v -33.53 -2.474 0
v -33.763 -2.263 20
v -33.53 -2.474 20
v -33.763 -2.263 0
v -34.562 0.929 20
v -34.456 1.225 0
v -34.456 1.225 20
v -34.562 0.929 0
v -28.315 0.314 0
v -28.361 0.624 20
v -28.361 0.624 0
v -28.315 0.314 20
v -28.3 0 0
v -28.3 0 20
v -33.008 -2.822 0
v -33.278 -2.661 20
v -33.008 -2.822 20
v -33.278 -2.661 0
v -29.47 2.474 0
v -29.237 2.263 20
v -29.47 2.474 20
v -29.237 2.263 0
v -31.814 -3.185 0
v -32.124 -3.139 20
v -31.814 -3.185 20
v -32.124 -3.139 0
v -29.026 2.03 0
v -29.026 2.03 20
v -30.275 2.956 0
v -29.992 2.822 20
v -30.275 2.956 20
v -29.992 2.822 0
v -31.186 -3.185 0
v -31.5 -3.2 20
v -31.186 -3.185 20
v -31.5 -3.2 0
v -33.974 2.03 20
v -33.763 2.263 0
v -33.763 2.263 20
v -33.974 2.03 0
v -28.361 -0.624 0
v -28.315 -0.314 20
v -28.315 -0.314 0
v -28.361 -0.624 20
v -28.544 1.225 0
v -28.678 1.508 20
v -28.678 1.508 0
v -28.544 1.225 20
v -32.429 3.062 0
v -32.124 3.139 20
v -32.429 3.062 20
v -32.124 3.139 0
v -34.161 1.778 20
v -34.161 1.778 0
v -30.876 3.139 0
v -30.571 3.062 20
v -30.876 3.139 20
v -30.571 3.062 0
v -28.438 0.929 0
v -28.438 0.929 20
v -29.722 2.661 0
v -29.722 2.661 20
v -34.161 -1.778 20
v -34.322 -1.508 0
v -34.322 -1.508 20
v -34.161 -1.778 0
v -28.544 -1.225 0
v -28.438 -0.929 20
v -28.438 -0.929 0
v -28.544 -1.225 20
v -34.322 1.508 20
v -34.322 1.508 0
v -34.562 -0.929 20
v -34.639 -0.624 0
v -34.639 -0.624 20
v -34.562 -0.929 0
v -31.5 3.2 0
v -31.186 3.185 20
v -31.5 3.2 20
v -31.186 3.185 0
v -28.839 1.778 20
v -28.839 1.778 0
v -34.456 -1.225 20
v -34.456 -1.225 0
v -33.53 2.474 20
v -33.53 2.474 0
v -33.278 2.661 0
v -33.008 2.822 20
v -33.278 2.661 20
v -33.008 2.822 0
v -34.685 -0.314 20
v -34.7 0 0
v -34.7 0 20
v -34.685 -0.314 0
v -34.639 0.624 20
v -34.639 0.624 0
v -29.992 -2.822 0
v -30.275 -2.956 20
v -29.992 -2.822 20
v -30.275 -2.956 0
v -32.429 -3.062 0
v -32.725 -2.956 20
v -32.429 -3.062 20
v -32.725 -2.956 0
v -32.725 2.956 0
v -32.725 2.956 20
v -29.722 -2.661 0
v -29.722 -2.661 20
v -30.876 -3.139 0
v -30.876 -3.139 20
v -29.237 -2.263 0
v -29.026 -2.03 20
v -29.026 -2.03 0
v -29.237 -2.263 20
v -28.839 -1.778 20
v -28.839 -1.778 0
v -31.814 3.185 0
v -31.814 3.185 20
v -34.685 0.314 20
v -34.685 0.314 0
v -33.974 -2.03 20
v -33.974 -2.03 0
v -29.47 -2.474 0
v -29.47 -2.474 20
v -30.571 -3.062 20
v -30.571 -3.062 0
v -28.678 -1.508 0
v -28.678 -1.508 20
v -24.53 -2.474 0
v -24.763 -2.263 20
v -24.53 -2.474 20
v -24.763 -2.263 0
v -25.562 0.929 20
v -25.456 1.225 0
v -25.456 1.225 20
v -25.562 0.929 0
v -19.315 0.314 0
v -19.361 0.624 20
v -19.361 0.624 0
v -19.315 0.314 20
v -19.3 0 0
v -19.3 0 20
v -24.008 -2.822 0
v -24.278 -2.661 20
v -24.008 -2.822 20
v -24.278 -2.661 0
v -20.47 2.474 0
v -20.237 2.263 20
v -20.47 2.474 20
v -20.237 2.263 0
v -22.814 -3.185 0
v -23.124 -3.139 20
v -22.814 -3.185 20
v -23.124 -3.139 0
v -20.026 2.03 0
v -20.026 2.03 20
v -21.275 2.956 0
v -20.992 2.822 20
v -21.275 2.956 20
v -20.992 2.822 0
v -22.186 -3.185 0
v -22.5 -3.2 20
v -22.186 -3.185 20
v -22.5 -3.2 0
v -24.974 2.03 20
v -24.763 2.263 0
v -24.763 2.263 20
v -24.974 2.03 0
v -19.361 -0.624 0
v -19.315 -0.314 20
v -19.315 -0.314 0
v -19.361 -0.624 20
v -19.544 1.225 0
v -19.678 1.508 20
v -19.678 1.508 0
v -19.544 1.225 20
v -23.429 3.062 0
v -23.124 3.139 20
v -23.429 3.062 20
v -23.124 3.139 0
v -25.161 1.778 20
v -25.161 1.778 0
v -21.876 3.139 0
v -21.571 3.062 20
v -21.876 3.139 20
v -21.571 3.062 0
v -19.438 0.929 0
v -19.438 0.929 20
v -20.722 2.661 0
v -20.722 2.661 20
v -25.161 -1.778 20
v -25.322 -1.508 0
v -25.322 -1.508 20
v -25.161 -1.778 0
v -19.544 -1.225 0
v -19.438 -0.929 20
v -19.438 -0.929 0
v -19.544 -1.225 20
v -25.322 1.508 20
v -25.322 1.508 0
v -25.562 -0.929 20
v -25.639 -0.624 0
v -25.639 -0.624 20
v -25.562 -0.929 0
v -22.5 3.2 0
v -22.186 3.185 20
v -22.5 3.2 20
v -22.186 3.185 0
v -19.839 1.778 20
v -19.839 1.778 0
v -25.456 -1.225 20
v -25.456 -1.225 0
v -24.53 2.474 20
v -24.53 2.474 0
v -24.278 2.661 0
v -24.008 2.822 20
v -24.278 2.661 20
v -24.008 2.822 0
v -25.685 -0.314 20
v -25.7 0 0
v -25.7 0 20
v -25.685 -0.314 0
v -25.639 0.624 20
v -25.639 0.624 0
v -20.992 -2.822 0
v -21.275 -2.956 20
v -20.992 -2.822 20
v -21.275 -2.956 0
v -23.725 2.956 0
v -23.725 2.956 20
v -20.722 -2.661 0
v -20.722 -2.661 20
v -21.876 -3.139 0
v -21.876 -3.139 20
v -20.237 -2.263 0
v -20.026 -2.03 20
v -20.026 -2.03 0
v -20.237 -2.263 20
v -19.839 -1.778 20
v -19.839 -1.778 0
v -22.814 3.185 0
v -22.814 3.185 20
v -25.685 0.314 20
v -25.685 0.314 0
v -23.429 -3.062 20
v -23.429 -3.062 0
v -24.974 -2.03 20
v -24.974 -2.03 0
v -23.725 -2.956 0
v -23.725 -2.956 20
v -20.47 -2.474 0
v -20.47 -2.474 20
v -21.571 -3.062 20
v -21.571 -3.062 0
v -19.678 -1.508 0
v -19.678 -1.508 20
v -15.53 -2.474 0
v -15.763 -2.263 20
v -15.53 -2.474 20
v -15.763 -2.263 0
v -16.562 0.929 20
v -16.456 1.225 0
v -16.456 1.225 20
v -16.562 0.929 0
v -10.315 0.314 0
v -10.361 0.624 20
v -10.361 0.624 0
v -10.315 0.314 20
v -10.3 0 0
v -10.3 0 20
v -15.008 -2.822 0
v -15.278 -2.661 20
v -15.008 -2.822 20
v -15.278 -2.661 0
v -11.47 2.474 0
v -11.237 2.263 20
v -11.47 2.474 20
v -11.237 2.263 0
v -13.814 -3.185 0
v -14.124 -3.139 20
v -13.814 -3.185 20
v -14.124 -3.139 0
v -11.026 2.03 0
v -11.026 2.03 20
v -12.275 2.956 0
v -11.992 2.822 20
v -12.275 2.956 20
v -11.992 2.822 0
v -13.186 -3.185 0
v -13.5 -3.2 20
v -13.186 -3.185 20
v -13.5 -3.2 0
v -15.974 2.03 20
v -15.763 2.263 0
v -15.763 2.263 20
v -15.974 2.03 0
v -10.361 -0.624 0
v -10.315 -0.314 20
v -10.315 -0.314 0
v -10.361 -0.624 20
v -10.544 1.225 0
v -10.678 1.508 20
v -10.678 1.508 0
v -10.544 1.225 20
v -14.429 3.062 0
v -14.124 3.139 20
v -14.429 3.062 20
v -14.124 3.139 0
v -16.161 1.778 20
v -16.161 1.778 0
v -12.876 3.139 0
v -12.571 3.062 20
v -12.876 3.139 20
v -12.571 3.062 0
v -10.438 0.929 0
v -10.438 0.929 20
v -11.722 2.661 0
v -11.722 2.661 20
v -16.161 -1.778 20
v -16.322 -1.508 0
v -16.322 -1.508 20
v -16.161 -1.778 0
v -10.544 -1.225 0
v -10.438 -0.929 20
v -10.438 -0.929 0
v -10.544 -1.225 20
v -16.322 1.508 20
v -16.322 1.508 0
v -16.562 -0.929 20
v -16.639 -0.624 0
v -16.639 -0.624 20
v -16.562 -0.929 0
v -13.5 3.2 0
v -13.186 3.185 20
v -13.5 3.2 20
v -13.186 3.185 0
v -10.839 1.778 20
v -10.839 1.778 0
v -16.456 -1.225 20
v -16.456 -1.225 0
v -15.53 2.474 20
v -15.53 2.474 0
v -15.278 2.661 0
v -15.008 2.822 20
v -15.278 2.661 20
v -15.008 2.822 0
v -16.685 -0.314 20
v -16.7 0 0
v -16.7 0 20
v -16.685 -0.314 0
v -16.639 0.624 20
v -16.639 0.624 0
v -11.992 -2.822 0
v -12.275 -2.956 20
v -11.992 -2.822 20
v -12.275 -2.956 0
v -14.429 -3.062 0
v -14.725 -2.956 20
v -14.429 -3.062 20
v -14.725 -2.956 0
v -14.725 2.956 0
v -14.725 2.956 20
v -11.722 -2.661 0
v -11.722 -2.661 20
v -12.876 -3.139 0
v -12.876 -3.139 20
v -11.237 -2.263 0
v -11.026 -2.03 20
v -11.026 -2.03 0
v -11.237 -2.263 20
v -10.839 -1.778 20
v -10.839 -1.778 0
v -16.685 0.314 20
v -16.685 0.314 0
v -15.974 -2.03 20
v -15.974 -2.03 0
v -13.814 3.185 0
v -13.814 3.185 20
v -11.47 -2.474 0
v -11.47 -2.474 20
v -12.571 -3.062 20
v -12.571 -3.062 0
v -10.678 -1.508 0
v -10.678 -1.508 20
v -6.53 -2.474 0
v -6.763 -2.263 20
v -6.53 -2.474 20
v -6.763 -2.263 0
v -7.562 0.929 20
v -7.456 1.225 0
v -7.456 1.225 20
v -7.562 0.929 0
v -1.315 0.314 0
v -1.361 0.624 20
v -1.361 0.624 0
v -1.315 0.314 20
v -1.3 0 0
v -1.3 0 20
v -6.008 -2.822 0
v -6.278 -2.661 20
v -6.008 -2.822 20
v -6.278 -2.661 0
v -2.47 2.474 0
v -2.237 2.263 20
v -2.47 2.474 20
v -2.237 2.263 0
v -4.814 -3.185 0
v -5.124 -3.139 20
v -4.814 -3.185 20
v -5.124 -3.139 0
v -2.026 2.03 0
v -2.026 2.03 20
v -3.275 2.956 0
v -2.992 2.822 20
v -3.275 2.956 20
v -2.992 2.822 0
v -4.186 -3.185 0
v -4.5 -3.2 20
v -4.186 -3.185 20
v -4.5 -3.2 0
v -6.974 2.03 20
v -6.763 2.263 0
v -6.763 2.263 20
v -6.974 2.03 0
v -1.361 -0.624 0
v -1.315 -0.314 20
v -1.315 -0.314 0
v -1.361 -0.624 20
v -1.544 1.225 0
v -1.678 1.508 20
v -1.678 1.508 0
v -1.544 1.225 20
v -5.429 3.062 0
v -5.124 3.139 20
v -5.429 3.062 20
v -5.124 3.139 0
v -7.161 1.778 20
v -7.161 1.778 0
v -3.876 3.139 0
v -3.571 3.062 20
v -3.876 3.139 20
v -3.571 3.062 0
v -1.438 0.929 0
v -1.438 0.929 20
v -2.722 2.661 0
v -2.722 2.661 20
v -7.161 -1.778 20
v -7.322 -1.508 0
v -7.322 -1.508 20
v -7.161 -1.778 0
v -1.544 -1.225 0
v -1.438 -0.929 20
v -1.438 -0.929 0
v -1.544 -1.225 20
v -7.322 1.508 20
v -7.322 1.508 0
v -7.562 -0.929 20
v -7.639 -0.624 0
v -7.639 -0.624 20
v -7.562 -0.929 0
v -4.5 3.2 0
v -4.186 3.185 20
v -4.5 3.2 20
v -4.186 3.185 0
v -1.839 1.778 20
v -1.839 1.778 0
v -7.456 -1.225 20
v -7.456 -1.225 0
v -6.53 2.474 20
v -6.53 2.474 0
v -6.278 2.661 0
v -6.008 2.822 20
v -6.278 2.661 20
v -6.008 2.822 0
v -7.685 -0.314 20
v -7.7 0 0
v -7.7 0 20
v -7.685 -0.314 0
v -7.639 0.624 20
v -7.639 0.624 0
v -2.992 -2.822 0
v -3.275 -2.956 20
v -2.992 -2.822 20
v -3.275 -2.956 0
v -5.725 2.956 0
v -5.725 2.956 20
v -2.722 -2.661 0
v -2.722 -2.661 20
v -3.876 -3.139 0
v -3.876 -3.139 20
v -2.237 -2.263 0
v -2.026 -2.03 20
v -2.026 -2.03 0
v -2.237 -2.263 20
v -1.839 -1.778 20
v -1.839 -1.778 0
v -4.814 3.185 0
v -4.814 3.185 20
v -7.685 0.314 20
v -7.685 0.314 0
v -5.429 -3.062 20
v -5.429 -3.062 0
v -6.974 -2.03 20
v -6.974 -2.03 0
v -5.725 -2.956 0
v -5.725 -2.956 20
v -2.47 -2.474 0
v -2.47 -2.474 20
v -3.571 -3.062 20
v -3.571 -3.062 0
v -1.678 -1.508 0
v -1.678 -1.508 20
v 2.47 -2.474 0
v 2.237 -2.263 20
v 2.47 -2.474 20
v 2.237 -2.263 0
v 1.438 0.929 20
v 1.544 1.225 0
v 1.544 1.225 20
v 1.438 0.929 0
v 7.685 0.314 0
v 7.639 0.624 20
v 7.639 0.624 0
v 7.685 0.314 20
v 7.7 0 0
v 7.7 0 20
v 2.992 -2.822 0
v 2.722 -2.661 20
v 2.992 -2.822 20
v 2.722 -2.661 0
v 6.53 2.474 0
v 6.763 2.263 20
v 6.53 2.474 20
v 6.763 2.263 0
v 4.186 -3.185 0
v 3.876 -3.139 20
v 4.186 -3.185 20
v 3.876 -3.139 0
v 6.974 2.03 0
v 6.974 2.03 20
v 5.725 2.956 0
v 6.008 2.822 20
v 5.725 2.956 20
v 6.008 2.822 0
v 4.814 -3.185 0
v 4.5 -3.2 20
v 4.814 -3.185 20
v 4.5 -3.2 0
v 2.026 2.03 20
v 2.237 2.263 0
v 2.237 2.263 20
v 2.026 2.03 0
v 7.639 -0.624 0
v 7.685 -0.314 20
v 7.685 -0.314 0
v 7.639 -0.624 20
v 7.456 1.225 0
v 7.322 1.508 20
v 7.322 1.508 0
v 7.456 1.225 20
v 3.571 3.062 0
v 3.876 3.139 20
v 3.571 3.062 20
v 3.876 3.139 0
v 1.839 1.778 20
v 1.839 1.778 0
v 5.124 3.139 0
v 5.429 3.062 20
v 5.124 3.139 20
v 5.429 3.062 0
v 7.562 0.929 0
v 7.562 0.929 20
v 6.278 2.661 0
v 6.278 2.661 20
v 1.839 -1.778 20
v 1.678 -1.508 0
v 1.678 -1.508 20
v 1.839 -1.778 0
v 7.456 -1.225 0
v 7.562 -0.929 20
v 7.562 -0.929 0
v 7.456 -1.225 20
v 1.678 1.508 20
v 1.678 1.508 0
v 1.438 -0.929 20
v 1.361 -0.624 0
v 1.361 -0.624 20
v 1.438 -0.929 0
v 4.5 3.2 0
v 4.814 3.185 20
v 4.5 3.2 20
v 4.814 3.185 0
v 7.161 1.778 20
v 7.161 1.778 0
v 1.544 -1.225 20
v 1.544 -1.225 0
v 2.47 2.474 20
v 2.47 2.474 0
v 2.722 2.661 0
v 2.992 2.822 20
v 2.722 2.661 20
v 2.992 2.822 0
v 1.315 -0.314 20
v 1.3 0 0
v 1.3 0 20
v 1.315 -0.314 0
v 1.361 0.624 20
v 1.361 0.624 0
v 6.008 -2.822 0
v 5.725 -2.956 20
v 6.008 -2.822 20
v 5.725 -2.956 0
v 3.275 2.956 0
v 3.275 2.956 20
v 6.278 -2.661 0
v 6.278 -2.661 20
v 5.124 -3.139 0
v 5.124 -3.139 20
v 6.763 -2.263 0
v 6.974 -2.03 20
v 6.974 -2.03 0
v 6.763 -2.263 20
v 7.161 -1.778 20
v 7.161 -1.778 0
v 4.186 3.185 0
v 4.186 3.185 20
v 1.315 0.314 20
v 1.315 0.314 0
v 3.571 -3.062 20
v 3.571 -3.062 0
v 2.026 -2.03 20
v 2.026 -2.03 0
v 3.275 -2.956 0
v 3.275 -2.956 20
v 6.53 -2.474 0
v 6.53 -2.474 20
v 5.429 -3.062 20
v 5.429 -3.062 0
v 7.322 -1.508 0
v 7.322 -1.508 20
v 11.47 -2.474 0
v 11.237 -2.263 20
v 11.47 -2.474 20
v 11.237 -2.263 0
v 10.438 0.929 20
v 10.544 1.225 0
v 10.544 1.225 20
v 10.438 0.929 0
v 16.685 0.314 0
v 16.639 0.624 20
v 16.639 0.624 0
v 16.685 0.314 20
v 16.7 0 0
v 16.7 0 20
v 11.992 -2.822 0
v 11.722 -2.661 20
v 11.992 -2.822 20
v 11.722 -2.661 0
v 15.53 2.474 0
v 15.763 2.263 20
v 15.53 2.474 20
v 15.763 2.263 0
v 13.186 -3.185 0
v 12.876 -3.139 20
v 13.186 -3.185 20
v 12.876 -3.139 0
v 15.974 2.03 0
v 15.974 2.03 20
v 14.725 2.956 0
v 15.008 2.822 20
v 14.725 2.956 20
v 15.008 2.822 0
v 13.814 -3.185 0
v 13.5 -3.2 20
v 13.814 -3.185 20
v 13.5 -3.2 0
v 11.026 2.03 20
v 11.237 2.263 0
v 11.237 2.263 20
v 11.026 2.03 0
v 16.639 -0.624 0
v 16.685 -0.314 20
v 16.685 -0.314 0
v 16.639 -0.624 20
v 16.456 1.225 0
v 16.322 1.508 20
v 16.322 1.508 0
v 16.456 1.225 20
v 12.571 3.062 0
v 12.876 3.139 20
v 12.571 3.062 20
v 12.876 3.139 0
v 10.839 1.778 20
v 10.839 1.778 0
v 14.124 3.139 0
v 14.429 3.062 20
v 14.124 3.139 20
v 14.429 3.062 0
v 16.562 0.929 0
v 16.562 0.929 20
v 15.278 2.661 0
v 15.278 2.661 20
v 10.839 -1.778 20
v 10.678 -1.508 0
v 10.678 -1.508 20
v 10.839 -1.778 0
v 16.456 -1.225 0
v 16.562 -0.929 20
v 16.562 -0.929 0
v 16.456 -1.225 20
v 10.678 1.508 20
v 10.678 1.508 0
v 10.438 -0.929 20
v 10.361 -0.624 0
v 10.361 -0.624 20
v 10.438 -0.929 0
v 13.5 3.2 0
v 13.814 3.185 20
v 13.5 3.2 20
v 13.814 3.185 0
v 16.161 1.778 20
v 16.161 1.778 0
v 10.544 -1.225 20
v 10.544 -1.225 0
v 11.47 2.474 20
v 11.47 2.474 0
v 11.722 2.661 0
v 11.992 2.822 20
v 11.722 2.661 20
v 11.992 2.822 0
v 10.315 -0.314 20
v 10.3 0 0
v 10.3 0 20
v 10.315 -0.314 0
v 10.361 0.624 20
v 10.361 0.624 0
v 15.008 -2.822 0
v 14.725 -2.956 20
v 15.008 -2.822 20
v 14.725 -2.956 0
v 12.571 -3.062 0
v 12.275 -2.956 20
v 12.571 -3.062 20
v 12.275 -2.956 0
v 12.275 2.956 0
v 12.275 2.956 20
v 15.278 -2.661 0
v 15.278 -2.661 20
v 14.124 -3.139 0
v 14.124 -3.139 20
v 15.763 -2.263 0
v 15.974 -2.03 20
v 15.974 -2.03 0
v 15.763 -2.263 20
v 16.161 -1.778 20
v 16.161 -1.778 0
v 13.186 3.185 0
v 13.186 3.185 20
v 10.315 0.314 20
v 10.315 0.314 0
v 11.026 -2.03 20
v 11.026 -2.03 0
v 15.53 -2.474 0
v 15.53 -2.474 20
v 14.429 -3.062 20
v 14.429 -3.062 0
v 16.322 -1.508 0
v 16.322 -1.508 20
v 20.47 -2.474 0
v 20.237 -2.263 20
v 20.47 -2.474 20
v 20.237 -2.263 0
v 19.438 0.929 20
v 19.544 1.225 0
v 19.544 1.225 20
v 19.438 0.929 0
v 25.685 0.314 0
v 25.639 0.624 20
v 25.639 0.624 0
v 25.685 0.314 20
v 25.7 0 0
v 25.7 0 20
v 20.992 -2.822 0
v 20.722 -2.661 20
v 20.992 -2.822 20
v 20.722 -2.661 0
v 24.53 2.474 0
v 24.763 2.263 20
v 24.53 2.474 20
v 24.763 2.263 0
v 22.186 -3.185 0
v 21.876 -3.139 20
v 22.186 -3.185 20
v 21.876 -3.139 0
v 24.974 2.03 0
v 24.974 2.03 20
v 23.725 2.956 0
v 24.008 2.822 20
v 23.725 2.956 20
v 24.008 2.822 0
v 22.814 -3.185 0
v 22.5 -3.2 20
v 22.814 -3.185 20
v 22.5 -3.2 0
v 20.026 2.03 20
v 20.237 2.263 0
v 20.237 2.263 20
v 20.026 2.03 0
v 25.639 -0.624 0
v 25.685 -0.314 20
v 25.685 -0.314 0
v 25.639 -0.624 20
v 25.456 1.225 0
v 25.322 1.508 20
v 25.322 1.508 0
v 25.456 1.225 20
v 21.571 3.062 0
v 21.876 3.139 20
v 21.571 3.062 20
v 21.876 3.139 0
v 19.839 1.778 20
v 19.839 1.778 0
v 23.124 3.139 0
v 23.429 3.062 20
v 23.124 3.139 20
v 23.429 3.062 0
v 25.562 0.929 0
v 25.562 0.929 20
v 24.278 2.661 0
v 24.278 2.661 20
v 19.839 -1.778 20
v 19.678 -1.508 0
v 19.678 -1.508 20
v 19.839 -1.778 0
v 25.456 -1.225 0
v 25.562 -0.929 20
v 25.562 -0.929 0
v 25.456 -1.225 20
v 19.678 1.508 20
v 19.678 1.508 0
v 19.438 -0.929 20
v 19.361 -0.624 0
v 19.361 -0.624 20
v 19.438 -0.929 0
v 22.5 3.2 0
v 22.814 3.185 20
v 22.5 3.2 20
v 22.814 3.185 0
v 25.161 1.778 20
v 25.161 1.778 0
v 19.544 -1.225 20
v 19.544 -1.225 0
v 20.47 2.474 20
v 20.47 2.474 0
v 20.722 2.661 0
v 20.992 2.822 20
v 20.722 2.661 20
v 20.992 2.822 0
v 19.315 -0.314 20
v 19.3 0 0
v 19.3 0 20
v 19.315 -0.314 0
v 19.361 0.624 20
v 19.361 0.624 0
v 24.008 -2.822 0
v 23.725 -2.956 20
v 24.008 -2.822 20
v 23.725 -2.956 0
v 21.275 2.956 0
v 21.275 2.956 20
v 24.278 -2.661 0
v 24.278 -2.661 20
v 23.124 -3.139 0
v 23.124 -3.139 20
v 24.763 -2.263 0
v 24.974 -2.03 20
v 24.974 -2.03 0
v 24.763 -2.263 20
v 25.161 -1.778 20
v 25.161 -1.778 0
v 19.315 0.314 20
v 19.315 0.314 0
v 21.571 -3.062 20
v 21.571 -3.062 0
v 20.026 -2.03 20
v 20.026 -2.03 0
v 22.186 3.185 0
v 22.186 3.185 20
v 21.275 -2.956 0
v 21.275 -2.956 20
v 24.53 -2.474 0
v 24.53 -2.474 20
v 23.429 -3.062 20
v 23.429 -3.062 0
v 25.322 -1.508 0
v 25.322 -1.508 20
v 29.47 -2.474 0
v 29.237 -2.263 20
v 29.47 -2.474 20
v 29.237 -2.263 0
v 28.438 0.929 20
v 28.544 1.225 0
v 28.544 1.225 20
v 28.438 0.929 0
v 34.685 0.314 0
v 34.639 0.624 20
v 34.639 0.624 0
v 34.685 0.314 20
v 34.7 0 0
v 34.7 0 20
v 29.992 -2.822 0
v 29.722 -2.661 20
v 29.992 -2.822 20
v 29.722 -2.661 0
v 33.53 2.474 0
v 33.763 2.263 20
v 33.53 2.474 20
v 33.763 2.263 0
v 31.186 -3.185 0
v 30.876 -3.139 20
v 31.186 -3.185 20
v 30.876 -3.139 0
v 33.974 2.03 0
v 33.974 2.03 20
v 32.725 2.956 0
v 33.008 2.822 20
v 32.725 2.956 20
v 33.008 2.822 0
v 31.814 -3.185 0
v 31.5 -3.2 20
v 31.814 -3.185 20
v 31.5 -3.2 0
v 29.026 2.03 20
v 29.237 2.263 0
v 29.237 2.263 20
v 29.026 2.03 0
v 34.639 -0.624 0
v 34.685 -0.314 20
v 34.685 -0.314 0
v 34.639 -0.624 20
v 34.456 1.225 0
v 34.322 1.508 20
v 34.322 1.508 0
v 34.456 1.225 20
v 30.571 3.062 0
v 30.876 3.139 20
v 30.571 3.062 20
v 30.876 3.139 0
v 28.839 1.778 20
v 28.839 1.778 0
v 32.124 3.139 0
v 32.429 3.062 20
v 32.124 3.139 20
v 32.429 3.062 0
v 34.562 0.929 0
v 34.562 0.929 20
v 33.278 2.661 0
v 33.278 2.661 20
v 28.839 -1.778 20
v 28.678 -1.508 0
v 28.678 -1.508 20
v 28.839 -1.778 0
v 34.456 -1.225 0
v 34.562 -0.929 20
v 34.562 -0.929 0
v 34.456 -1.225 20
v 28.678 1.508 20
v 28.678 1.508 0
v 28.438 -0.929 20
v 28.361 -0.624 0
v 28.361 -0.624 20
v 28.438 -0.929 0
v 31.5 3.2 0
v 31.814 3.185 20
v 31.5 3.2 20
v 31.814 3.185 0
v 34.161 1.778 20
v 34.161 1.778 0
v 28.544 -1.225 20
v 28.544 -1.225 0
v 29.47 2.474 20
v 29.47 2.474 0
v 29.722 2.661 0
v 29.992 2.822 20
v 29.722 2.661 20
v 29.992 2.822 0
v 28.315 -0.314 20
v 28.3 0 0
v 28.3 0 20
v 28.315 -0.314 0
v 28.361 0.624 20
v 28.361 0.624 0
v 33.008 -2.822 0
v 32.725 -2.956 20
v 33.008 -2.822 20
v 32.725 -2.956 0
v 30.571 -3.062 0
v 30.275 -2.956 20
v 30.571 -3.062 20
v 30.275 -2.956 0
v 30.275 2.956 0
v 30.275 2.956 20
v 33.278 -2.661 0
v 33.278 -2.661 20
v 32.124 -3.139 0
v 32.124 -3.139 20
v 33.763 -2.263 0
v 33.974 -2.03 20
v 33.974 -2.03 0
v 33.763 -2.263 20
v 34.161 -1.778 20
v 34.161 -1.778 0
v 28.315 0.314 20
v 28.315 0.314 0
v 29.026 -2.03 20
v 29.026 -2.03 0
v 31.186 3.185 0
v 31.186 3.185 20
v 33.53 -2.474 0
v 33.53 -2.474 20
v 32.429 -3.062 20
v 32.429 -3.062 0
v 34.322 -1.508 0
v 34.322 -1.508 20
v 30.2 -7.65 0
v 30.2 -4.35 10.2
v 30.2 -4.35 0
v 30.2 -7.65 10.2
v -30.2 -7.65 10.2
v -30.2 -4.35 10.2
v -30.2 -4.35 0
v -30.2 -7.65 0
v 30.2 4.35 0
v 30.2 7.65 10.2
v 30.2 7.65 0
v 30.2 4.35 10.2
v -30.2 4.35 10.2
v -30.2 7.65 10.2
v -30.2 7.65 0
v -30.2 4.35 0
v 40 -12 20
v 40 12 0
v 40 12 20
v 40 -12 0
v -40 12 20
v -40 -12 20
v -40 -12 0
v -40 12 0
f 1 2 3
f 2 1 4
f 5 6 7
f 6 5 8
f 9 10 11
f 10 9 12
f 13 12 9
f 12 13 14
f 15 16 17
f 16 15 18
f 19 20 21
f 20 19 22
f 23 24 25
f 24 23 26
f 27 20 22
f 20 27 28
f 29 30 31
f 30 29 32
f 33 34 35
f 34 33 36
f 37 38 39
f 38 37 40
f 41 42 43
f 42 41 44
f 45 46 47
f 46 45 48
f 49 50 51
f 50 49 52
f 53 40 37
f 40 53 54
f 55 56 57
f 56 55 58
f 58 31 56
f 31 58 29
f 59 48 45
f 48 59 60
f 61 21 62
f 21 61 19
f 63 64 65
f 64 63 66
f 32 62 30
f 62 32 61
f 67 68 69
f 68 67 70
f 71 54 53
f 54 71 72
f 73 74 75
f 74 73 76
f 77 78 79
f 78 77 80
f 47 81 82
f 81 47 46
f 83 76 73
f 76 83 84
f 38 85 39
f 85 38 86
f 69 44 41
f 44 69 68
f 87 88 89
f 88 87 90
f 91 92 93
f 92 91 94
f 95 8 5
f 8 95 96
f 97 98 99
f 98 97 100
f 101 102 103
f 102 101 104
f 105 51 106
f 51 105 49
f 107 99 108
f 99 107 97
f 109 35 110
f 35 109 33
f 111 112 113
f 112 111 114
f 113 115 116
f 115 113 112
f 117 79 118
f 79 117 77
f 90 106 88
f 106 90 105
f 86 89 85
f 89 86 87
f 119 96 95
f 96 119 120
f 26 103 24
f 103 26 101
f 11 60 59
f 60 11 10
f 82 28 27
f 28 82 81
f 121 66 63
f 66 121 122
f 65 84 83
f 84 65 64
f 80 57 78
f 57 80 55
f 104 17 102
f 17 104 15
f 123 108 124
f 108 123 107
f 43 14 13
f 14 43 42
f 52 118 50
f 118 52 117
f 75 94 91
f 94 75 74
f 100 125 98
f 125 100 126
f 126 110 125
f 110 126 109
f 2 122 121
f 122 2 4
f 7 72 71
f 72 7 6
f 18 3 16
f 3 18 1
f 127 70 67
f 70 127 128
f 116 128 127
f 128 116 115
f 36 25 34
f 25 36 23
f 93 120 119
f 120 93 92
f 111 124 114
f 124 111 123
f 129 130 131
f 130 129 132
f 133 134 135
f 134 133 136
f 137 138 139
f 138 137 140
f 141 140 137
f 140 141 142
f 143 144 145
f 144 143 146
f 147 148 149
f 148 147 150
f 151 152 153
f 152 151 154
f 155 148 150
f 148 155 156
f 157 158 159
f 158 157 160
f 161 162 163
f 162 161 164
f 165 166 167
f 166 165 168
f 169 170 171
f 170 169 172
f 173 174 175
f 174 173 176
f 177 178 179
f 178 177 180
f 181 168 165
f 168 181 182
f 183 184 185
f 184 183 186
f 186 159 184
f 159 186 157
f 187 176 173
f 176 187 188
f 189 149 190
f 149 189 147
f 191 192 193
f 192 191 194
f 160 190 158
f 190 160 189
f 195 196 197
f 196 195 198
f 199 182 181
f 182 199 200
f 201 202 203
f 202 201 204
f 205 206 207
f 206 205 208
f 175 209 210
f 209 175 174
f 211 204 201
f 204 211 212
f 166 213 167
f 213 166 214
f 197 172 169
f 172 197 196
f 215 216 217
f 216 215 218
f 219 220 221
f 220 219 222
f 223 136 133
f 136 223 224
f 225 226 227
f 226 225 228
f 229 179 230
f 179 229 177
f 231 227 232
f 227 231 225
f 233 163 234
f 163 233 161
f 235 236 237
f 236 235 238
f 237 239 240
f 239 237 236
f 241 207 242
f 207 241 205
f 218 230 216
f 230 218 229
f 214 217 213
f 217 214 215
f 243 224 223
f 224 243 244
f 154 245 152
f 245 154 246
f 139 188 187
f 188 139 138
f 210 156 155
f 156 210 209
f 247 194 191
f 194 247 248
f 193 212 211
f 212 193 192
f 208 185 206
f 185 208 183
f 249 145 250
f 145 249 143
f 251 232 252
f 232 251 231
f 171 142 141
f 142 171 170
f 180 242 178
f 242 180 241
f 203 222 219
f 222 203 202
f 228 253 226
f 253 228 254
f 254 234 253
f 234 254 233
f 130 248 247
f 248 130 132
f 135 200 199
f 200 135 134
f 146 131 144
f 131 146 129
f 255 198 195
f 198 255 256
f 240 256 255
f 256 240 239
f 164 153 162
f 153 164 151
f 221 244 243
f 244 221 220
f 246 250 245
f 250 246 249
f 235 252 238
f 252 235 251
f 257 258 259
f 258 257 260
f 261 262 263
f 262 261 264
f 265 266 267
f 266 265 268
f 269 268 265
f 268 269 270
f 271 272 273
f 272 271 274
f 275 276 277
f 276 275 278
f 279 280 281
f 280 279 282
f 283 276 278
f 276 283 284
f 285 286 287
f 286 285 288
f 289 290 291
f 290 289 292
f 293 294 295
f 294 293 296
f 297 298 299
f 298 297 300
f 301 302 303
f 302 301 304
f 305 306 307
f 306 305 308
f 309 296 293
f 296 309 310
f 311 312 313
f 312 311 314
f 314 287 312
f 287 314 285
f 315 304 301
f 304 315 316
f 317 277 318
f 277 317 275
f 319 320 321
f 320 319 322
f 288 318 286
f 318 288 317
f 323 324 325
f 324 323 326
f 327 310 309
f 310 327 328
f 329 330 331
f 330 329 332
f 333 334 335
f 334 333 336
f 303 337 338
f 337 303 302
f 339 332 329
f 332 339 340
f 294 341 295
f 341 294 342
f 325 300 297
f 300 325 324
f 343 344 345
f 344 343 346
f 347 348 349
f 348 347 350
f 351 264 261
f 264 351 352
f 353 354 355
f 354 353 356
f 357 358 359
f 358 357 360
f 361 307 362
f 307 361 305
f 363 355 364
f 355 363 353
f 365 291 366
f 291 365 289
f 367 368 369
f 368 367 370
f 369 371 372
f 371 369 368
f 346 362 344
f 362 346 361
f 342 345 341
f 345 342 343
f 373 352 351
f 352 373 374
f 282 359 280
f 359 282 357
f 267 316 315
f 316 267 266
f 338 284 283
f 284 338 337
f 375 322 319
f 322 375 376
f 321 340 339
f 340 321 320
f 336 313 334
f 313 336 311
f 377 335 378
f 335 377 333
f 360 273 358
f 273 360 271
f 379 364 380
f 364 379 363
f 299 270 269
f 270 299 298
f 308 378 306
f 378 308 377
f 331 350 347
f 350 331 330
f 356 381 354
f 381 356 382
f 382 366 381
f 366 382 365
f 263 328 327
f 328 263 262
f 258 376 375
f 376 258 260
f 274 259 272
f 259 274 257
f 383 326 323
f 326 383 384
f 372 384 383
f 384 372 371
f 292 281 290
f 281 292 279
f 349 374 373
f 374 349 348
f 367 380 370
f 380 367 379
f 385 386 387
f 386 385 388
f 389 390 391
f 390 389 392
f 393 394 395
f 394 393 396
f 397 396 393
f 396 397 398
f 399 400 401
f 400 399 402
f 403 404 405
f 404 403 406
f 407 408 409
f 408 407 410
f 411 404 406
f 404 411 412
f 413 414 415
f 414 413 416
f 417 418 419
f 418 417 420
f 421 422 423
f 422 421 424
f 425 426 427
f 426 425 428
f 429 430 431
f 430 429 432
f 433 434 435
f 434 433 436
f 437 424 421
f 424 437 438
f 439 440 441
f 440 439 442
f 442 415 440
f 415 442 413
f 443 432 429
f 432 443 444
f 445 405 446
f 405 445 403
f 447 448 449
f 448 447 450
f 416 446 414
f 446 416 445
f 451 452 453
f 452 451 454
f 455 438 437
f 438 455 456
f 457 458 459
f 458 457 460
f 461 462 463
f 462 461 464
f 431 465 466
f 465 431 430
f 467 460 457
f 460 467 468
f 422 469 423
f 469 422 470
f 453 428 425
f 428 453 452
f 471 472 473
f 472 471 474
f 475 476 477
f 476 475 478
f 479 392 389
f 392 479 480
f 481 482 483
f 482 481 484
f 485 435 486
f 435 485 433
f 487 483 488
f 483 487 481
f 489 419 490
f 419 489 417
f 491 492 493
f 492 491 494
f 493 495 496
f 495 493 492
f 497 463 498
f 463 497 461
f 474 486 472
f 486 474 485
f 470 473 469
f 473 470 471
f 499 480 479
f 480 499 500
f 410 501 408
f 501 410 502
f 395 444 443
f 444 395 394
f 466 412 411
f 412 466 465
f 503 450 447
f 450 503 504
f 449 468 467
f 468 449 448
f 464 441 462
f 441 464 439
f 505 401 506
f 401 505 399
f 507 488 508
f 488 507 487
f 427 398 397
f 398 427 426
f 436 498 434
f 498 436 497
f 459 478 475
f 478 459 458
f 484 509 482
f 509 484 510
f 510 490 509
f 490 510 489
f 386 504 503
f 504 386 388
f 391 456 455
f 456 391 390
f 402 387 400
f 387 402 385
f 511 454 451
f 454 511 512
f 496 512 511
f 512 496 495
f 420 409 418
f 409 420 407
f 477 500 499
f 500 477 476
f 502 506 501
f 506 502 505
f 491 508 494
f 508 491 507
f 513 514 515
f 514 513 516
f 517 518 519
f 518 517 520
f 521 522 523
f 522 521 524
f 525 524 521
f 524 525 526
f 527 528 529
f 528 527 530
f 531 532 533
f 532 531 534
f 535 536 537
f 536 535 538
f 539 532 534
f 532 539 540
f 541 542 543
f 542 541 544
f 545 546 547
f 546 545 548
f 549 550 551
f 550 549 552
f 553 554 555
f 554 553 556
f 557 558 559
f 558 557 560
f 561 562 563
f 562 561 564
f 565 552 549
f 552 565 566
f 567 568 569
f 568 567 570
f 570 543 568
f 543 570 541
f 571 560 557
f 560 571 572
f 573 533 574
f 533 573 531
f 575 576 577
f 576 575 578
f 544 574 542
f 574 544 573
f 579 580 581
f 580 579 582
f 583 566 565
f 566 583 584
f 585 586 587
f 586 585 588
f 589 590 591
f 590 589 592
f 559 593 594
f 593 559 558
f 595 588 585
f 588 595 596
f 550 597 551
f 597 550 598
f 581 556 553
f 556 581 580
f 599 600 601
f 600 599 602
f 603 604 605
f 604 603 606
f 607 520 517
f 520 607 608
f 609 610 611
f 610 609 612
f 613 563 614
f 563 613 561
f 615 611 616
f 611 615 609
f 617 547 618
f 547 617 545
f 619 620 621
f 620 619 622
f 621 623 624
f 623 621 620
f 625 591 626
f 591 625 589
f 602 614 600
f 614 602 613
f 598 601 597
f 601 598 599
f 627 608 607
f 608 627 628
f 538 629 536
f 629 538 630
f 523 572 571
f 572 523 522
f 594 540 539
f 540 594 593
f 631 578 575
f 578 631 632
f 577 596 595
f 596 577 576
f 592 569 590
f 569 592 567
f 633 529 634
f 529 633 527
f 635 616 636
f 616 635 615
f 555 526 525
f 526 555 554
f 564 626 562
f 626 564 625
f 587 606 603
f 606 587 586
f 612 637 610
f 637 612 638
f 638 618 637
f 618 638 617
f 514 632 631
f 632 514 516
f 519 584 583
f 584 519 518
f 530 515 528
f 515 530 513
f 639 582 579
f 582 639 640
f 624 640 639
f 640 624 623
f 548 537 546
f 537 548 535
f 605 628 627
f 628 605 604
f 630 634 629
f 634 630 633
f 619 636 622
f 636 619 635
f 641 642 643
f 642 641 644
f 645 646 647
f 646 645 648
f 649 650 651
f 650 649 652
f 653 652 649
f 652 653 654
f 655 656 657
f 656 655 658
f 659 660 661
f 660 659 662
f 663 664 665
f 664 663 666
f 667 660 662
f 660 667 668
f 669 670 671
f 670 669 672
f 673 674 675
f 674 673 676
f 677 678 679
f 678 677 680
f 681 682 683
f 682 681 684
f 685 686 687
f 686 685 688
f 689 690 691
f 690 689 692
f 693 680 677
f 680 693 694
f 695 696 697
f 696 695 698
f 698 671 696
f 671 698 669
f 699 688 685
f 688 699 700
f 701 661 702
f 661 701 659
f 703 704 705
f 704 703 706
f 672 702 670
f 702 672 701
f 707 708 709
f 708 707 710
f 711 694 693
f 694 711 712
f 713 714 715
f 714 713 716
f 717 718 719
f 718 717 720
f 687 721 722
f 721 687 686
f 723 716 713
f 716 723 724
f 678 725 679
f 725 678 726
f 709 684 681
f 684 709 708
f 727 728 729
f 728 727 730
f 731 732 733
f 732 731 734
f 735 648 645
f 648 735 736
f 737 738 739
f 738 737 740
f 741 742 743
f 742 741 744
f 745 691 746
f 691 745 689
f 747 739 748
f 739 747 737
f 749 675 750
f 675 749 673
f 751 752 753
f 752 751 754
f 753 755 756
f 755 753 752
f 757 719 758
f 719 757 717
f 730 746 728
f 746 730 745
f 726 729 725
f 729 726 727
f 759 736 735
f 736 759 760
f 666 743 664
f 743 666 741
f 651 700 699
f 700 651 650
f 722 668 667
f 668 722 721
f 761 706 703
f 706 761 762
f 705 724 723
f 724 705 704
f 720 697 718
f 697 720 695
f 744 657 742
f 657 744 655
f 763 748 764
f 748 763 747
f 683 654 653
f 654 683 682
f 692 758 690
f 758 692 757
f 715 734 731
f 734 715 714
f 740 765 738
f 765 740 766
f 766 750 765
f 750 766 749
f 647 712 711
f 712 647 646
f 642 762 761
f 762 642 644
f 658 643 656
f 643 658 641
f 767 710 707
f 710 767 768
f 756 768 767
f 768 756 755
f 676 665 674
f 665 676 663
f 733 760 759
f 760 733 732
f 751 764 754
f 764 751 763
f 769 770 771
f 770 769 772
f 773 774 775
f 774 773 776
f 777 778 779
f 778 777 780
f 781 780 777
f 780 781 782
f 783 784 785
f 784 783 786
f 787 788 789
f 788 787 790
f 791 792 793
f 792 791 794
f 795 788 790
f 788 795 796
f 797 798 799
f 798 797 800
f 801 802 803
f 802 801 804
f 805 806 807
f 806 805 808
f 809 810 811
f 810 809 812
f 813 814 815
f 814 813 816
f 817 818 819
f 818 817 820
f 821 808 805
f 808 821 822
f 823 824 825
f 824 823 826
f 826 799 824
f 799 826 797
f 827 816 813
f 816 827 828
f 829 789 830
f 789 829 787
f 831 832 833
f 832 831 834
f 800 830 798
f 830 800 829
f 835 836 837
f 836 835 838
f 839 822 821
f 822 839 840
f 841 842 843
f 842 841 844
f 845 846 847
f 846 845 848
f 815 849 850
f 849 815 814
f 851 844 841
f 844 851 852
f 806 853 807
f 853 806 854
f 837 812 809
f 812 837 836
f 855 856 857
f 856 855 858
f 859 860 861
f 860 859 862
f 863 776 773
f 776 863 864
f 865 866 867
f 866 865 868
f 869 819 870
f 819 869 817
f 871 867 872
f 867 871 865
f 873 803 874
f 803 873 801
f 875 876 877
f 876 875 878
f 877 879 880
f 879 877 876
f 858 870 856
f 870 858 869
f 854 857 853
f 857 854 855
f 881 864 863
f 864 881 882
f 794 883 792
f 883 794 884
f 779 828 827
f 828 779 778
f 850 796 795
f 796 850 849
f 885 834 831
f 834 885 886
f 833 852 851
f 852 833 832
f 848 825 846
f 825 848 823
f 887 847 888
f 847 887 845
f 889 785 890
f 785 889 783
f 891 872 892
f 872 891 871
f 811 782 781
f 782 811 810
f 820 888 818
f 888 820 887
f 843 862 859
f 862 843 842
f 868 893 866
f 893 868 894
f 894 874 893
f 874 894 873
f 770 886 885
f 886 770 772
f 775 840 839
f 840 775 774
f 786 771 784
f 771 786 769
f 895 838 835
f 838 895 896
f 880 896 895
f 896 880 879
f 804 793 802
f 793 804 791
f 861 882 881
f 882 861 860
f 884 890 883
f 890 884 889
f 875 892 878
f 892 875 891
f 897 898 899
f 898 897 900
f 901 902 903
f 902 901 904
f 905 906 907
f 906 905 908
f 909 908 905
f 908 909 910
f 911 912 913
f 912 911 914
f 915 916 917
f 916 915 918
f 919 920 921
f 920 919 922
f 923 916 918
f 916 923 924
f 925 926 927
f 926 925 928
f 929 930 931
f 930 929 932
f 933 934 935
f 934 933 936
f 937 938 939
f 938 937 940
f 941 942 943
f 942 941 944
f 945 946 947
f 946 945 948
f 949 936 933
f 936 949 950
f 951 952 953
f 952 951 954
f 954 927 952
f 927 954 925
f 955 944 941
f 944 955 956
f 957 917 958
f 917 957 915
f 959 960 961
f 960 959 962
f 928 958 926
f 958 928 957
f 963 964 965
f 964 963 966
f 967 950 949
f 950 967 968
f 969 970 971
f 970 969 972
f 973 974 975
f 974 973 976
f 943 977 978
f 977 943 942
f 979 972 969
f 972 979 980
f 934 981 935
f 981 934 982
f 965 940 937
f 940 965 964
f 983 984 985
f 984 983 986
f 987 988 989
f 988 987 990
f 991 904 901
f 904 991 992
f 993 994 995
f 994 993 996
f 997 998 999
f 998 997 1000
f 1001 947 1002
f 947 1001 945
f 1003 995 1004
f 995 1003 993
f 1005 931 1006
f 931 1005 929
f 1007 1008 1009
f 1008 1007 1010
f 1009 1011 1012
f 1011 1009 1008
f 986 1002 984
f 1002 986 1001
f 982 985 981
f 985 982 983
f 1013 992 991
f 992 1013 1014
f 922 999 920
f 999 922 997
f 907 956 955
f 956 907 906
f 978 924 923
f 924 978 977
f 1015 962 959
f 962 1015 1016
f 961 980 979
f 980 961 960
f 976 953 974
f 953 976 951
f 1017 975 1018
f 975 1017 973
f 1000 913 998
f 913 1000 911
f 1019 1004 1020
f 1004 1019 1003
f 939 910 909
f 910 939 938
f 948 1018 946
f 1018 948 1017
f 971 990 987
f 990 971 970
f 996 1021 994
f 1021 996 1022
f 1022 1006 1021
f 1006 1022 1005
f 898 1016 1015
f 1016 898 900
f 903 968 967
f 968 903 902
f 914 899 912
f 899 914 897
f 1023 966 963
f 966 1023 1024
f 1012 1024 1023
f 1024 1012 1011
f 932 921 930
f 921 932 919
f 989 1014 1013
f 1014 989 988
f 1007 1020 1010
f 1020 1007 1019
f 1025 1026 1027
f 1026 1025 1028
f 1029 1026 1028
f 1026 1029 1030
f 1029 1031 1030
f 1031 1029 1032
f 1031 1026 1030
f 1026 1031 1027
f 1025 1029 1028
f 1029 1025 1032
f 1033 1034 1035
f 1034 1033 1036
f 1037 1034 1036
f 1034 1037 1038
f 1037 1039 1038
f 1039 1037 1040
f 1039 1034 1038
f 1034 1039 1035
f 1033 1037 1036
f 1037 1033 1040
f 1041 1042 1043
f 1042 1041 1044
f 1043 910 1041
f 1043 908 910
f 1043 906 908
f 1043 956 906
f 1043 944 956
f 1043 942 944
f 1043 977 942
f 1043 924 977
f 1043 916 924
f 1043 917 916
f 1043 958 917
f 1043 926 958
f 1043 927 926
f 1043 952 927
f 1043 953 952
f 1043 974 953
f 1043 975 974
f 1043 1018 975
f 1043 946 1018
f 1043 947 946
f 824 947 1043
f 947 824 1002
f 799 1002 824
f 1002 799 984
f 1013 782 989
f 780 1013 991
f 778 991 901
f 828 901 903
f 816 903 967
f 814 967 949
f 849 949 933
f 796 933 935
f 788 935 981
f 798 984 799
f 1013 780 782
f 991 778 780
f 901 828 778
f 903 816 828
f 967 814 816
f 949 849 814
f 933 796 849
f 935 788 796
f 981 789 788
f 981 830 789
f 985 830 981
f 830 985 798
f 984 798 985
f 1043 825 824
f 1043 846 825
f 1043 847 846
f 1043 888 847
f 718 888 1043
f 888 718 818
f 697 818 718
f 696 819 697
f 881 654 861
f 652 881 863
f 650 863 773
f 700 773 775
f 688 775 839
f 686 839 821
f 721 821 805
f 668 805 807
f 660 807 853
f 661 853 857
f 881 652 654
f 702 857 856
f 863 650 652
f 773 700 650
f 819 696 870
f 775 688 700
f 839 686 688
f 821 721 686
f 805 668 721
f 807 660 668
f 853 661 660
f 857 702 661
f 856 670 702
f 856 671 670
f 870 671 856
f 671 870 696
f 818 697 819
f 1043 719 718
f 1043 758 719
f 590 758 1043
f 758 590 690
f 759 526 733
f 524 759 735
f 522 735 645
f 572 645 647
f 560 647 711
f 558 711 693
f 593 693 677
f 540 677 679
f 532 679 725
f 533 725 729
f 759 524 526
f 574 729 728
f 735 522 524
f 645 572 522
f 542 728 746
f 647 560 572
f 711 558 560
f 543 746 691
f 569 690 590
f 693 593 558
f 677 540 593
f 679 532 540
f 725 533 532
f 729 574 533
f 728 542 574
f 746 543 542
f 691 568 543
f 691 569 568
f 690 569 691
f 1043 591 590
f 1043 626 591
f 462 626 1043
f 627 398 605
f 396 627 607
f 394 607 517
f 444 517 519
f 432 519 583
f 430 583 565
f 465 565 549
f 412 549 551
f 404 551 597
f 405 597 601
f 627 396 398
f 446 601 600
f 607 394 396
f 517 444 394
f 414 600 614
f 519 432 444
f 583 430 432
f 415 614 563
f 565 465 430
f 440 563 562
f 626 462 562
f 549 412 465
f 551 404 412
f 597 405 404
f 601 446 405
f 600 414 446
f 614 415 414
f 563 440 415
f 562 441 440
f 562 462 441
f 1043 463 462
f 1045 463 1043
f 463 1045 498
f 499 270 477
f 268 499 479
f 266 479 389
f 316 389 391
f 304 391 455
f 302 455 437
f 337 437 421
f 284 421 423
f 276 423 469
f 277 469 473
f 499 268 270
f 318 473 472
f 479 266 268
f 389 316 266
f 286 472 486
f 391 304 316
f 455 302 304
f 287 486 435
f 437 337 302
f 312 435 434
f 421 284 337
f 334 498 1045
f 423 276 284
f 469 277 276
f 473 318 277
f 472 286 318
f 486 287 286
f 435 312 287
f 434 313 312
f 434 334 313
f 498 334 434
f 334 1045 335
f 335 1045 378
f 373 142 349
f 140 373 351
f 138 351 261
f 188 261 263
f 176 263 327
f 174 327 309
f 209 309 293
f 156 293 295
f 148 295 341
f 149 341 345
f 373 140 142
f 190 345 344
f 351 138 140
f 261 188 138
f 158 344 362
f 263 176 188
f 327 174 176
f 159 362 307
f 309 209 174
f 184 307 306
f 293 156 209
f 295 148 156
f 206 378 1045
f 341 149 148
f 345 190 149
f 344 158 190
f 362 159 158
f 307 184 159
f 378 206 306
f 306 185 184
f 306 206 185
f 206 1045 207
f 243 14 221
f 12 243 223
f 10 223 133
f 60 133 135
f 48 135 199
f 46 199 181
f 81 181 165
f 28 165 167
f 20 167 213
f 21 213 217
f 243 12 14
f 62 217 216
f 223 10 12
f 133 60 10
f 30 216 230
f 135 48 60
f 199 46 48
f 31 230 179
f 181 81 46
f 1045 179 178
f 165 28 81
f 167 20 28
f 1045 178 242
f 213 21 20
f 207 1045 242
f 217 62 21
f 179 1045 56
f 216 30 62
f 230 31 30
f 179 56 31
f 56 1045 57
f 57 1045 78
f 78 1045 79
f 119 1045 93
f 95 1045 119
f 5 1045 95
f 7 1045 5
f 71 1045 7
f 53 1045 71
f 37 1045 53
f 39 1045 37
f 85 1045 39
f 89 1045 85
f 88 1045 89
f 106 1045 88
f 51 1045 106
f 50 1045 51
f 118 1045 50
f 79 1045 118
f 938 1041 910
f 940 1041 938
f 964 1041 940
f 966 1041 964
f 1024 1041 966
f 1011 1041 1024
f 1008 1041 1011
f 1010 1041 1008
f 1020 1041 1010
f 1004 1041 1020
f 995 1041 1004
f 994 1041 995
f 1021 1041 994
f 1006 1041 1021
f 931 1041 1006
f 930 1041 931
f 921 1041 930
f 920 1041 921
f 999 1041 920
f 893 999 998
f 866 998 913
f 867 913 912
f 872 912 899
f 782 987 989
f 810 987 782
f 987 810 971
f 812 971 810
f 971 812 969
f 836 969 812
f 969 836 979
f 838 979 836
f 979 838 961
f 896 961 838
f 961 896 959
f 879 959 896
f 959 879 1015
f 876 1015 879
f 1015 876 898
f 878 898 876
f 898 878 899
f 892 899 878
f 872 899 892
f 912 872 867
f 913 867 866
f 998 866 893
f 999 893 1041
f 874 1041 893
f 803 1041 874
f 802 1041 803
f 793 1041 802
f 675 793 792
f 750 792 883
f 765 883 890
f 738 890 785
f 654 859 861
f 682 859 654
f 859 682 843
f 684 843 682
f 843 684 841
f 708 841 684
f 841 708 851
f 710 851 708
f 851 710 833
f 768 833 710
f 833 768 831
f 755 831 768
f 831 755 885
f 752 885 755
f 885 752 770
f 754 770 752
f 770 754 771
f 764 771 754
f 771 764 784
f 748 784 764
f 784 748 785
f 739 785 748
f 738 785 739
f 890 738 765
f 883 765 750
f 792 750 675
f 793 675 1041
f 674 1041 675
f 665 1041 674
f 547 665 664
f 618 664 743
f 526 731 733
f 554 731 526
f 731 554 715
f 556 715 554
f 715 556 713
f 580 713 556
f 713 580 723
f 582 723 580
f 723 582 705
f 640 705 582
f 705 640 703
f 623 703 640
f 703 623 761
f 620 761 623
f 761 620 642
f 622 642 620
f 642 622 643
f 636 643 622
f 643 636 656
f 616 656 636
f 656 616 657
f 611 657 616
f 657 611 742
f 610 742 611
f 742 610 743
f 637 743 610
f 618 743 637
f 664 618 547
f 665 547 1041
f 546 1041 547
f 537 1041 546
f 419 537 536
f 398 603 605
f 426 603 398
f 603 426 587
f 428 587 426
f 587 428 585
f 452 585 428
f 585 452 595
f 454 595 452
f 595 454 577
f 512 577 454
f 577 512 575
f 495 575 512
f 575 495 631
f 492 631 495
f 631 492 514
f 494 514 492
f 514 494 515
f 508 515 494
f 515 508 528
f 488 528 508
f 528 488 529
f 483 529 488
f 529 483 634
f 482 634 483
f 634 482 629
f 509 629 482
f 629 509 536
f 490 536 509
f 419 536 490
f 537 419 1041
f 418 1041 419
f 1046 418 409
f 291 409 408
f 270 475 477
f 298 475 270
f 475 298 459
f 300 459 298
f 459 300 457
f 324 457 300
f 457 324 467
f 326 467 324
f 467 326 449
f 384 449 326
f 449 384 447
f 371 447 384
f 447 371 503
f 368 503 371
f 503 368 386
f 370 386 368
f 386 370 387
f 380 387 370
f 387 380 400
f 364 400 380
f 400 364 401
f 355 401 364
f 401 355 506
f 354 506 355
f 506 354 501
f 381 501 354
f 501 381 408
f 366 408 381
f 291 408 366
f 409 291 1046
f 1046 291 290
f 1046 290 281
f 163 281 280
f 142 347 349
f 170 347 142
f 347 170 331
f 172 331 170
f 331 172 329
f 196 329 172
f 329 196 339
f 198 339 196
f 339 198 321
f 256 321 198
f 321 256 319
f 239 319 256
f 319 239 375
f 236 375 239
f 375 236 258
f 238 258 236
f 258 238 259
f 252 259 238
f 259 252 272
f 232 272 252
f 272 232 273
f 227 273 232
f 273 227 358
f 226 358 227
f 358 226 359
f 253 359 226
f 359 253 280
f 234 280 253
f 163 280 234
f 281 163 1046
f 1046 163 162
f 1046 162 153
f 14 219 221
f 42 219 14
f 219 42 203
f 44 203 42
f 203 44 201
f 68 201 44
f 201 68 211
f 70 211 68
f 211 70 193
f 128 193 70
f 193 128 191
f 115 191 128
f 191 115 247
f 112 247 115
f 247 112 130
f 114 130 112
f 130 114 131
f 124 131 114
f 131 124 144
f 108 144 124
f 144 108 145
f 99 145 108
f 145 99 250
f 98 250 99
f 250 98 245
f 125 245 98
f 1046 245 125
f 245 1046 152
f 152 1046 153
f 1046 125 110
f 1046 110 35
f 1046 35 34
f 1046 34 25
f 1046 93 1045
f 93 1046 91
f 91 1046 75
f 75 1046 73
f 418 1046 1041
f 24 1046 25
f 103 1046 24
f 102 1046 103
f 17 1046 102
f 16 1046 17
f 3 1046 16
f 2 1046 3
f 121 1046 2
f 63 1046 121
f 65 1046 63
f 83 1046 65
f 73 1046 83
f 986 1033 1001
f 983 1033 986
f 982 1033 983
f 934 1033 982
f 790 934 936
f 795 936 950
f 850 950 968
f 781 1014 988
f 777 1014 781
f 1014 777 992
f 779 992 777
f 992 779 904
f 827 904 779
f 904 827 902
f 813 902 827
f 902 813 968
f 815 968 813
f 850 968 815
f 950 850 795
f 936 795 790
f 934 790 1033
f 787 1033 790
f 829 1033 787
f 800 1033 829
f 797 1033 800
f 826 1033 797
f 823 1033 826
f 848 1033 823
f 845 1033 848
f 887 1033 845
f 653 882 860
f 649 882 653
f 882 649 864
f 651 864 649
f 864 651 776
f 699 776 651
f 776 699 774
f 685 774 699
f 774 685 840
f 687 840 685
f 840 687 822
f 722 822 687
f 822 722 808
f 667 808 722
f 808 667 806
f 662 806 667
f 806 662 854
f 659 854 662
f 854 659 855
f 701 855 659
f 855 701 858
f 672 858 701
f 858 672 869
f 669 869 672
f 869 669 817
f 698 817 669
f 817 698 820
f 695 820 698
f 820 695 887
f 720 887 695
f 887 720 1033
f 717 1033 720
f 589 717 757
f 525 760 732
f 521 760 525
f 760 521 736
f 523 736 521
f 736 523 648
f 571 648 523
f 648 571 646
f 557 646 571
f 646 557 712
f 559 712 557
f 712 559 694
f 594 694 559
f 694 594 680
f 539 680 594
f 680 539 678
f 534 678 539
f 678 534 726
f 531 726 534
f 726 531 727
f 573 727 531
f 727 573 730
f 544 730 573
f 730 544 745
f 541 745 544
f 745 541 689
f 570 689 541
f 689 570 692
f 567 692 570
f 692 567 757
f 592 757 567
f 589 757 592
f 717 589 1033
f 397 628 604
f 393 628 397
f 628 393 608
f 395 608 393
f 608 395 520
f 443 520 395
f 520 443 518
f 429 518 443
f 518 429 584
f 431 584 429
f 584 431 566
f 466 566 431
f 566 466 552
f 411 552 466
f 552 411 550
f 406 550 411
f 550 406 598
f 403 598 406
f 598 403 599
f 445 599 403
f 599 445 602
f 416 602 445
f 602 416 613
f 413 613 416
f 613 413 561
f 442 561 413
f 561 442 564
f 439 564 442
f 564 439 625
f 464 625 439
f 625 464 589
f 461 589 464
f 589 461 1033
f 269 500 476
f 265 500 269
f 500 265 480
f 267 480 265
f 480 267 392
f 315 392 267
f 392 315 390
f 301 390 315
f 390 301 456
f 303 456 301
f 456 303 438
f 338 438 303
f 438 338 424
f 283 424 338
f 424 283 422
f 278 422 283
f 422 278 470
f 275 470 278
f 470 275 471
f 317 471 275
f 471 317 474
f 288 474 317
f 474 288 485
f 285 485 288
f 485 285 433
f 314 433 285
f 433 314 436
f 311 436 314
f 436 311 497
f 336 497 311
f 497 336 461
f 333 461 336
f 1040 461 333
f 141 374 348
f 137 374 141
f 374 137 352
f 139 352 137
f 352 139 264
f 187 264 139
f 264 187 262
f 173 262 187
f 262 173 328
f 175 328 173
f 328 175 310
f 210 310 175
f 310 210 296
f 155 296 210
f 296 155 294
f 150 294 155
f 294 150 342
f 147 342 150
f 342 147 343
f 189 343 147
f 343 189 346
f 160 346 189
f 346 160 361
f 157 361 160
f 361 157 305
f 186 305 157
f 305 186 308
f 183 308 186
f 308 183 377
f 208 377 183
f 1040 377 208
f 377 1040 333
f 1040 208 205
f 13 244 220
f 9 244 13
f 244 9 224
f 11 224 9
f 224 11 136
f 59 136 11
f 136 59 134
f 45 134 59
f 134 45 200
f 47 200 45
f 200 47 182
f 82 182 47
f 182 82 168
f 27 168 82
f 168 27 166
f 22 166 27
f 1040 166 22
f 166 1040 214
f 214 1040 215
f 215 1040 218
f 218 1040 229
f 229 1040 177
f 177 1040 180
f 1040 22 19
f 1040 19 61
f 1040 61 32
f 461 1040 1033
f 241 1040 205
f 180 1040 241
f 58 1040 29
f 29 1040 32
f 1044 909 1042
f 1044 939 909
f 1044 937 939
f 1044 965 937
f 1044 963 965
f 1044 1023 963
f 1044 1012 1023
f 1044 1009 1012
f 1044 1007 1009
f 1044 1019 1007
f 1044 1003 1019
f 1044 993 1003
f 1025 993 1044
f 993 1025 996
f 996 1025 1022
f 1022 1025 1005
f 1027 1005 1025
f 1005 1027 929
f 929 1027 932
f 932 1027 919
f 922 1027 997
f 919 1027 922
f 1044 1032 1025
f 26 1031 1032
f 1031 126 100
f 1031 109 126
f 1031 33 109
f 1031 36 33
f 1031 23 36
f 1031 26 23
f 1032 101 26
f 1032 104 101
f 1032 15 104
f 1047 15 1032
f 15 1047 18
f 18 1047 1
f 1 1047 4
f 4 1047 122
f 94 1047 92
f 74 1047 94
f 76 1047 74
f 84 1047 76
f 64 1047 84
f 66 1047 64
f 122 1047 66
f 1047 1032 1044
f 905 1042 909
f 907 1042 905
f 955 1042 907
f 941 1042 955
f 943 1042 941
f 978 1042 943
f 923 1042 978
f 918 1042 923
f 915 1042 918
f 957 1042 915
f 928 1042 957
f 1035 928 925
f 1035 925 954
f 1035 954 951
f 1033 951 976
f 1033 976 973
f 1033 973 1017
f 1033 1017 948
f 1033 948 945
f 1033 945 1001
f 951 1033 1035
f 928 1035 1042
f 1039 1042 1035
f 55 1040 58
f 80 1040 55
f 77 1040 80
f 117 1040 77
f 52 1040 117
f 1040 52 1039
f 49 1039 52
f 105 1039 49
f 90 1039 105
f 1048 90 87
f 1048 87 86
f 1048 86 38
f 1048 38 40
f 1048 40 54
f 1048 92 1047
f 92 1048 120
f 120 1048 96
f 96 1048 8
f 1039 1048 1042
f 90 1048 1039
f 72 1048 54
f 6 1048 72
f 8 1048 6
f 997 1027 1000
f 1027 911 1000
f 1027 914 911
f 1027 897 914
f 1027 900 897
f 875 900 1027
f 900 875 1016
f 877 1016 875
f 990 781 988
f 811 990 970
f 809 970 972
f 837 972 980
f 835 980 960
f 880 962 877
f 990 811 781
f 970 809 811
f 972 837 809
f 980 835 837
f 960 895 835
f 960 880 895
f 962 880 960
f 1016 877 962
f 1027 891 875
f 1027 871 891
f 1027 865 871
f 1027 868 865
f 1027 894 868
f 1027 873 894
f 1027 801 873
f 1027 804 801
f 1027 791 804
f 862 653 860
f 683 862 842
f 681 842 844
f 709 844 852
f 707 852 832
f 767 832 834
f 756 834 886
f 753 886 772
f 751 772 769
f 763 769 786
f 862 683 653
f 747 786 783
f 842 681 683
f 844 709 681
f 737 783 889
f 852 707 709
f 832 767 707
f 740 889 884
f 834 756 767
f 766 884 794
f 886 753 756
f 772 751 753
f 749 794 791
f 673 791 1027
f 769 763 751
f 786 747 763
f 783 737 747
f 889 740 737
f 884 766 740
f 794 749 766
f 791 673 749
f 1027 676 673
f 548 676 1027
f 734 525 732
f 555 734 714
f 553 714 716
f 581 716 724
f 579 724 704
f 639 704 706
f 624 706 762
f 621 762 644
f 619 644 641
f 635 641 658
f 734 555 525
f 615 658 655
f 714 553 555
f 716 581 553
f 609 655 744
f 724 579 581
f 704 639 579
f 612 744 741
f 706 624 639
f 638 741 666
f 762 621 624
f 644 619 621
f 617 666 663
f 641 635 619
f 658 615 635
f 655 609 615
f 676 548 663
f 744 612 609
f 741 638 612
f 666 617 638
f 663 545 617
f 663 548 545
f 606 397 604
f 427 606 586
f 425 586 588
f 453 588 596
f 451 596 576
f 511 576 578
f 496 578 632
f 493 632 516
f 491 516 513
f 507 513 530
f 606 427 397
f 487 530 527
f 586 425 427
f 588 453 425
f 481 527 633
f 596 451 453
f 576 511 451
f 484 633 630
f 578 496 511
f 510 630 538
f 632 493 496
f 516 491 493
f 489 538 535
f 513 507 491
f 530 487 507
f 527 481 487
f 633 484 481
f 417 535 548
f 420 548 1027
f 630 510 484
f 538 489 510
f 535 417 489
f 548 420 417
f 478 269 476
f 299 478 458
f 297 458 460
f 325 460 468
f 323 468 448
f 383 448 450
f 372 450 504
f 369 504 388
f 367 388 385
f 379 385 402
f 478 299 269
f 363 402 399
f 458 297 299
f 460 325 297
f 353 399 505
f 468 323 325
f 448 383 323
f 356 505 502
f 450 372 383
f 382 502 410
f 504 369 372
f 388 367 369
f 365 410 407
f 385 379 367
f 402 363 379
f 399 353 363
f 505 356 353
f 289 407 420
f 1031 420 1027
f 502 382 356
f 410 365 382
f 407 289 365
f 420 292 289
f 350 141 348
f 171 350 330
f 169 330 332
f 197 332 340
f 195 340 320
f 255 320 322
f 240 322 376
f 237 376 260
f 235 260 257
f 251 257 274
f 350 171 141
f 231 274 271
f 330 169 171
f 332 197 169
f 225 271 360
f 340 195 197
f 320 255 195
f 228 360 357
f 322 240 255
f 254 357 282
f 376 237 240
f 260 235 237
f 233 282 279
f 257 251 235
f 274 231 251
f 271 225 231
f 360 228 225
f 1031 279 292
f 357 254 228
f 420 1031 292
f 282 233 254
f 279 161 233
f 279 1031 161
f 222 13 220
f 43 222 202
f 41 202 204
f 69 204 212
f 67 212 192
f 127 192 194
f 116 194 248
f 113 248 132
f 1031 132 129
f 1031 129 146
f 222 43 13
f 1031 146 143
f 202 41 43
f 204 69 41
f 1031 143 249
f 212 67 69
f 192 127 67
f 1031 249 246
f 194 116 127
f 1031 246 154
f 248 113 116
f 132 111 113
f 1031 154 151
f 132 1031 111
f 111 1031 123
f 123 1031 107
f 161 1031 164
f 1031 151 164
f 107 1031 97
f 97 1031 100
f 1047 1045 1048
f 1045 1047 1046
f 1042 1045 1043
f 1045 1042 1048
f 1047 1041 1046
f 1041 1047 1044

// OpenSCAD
// KNOWN-WRONG PART (must fail): the tube seats are plain 6.4 mm through-holes (no cone, no floor)
// Magnetic bead separation rack for one 8-tube strip of 0.2 mL PCR tubes
// Category: tools. A block with a row of tube seats (cylinder + cone, closed below) and two
// pockets, open at the bottom face, for 60 x 10 x 3 mm N52 bar magnets beside the tubes.
// Print: PLA or PETG, standing on its bottom face, 0.2 mm layers; press the magnets in from
// below and secure each with a drop of glue.
// SPDX-License-Identifier: CERN-OHL-P-2.0

/* [Rack] */
block = [80, 24, 20];     // X, Y, Z [mm]
n_tubes = 8;
pitch = 9;                // PCR strip pitch [mm]
seat_d = 6.4;             // cylindrical part of the seat
seat_cyl_z = 12;          // the cylinder runs from here to the top face
tip_d = 3;                // the cone narrows to this diameter ...
tip_z = 2;                // ... at this height, where the seat ends (2 mm floor)
pocket = [60.4, 3.3, 10.2]; // magnet pocket X, Y, Z (60 x 3 x 10 mm magnet + clearance)
pocket_y = 6;             // pocket centre planes at y = -6 and y = +6

/* [Hidden] */
$fn = 64;
eps = 0.01;

difference() {
    translate([-block.x / 2, -block.y / 2, 0]) cube(block);
    for (i = [0 : n_tubes - 1])
        translate([(i - (n_tubes - 1) / 2) * pitch, 0, 0]) {
            translate([0, 0, -1]) cylinder(d = seat_d, h = block.z + 2);
        }
    for (s = [-1, 1])
        translate([-pocket.x / 2, s * pocket_y - pocket.y / 2, -eps])
            cube([pocket.x, pocket.y, pocket.z + eps]);
}
